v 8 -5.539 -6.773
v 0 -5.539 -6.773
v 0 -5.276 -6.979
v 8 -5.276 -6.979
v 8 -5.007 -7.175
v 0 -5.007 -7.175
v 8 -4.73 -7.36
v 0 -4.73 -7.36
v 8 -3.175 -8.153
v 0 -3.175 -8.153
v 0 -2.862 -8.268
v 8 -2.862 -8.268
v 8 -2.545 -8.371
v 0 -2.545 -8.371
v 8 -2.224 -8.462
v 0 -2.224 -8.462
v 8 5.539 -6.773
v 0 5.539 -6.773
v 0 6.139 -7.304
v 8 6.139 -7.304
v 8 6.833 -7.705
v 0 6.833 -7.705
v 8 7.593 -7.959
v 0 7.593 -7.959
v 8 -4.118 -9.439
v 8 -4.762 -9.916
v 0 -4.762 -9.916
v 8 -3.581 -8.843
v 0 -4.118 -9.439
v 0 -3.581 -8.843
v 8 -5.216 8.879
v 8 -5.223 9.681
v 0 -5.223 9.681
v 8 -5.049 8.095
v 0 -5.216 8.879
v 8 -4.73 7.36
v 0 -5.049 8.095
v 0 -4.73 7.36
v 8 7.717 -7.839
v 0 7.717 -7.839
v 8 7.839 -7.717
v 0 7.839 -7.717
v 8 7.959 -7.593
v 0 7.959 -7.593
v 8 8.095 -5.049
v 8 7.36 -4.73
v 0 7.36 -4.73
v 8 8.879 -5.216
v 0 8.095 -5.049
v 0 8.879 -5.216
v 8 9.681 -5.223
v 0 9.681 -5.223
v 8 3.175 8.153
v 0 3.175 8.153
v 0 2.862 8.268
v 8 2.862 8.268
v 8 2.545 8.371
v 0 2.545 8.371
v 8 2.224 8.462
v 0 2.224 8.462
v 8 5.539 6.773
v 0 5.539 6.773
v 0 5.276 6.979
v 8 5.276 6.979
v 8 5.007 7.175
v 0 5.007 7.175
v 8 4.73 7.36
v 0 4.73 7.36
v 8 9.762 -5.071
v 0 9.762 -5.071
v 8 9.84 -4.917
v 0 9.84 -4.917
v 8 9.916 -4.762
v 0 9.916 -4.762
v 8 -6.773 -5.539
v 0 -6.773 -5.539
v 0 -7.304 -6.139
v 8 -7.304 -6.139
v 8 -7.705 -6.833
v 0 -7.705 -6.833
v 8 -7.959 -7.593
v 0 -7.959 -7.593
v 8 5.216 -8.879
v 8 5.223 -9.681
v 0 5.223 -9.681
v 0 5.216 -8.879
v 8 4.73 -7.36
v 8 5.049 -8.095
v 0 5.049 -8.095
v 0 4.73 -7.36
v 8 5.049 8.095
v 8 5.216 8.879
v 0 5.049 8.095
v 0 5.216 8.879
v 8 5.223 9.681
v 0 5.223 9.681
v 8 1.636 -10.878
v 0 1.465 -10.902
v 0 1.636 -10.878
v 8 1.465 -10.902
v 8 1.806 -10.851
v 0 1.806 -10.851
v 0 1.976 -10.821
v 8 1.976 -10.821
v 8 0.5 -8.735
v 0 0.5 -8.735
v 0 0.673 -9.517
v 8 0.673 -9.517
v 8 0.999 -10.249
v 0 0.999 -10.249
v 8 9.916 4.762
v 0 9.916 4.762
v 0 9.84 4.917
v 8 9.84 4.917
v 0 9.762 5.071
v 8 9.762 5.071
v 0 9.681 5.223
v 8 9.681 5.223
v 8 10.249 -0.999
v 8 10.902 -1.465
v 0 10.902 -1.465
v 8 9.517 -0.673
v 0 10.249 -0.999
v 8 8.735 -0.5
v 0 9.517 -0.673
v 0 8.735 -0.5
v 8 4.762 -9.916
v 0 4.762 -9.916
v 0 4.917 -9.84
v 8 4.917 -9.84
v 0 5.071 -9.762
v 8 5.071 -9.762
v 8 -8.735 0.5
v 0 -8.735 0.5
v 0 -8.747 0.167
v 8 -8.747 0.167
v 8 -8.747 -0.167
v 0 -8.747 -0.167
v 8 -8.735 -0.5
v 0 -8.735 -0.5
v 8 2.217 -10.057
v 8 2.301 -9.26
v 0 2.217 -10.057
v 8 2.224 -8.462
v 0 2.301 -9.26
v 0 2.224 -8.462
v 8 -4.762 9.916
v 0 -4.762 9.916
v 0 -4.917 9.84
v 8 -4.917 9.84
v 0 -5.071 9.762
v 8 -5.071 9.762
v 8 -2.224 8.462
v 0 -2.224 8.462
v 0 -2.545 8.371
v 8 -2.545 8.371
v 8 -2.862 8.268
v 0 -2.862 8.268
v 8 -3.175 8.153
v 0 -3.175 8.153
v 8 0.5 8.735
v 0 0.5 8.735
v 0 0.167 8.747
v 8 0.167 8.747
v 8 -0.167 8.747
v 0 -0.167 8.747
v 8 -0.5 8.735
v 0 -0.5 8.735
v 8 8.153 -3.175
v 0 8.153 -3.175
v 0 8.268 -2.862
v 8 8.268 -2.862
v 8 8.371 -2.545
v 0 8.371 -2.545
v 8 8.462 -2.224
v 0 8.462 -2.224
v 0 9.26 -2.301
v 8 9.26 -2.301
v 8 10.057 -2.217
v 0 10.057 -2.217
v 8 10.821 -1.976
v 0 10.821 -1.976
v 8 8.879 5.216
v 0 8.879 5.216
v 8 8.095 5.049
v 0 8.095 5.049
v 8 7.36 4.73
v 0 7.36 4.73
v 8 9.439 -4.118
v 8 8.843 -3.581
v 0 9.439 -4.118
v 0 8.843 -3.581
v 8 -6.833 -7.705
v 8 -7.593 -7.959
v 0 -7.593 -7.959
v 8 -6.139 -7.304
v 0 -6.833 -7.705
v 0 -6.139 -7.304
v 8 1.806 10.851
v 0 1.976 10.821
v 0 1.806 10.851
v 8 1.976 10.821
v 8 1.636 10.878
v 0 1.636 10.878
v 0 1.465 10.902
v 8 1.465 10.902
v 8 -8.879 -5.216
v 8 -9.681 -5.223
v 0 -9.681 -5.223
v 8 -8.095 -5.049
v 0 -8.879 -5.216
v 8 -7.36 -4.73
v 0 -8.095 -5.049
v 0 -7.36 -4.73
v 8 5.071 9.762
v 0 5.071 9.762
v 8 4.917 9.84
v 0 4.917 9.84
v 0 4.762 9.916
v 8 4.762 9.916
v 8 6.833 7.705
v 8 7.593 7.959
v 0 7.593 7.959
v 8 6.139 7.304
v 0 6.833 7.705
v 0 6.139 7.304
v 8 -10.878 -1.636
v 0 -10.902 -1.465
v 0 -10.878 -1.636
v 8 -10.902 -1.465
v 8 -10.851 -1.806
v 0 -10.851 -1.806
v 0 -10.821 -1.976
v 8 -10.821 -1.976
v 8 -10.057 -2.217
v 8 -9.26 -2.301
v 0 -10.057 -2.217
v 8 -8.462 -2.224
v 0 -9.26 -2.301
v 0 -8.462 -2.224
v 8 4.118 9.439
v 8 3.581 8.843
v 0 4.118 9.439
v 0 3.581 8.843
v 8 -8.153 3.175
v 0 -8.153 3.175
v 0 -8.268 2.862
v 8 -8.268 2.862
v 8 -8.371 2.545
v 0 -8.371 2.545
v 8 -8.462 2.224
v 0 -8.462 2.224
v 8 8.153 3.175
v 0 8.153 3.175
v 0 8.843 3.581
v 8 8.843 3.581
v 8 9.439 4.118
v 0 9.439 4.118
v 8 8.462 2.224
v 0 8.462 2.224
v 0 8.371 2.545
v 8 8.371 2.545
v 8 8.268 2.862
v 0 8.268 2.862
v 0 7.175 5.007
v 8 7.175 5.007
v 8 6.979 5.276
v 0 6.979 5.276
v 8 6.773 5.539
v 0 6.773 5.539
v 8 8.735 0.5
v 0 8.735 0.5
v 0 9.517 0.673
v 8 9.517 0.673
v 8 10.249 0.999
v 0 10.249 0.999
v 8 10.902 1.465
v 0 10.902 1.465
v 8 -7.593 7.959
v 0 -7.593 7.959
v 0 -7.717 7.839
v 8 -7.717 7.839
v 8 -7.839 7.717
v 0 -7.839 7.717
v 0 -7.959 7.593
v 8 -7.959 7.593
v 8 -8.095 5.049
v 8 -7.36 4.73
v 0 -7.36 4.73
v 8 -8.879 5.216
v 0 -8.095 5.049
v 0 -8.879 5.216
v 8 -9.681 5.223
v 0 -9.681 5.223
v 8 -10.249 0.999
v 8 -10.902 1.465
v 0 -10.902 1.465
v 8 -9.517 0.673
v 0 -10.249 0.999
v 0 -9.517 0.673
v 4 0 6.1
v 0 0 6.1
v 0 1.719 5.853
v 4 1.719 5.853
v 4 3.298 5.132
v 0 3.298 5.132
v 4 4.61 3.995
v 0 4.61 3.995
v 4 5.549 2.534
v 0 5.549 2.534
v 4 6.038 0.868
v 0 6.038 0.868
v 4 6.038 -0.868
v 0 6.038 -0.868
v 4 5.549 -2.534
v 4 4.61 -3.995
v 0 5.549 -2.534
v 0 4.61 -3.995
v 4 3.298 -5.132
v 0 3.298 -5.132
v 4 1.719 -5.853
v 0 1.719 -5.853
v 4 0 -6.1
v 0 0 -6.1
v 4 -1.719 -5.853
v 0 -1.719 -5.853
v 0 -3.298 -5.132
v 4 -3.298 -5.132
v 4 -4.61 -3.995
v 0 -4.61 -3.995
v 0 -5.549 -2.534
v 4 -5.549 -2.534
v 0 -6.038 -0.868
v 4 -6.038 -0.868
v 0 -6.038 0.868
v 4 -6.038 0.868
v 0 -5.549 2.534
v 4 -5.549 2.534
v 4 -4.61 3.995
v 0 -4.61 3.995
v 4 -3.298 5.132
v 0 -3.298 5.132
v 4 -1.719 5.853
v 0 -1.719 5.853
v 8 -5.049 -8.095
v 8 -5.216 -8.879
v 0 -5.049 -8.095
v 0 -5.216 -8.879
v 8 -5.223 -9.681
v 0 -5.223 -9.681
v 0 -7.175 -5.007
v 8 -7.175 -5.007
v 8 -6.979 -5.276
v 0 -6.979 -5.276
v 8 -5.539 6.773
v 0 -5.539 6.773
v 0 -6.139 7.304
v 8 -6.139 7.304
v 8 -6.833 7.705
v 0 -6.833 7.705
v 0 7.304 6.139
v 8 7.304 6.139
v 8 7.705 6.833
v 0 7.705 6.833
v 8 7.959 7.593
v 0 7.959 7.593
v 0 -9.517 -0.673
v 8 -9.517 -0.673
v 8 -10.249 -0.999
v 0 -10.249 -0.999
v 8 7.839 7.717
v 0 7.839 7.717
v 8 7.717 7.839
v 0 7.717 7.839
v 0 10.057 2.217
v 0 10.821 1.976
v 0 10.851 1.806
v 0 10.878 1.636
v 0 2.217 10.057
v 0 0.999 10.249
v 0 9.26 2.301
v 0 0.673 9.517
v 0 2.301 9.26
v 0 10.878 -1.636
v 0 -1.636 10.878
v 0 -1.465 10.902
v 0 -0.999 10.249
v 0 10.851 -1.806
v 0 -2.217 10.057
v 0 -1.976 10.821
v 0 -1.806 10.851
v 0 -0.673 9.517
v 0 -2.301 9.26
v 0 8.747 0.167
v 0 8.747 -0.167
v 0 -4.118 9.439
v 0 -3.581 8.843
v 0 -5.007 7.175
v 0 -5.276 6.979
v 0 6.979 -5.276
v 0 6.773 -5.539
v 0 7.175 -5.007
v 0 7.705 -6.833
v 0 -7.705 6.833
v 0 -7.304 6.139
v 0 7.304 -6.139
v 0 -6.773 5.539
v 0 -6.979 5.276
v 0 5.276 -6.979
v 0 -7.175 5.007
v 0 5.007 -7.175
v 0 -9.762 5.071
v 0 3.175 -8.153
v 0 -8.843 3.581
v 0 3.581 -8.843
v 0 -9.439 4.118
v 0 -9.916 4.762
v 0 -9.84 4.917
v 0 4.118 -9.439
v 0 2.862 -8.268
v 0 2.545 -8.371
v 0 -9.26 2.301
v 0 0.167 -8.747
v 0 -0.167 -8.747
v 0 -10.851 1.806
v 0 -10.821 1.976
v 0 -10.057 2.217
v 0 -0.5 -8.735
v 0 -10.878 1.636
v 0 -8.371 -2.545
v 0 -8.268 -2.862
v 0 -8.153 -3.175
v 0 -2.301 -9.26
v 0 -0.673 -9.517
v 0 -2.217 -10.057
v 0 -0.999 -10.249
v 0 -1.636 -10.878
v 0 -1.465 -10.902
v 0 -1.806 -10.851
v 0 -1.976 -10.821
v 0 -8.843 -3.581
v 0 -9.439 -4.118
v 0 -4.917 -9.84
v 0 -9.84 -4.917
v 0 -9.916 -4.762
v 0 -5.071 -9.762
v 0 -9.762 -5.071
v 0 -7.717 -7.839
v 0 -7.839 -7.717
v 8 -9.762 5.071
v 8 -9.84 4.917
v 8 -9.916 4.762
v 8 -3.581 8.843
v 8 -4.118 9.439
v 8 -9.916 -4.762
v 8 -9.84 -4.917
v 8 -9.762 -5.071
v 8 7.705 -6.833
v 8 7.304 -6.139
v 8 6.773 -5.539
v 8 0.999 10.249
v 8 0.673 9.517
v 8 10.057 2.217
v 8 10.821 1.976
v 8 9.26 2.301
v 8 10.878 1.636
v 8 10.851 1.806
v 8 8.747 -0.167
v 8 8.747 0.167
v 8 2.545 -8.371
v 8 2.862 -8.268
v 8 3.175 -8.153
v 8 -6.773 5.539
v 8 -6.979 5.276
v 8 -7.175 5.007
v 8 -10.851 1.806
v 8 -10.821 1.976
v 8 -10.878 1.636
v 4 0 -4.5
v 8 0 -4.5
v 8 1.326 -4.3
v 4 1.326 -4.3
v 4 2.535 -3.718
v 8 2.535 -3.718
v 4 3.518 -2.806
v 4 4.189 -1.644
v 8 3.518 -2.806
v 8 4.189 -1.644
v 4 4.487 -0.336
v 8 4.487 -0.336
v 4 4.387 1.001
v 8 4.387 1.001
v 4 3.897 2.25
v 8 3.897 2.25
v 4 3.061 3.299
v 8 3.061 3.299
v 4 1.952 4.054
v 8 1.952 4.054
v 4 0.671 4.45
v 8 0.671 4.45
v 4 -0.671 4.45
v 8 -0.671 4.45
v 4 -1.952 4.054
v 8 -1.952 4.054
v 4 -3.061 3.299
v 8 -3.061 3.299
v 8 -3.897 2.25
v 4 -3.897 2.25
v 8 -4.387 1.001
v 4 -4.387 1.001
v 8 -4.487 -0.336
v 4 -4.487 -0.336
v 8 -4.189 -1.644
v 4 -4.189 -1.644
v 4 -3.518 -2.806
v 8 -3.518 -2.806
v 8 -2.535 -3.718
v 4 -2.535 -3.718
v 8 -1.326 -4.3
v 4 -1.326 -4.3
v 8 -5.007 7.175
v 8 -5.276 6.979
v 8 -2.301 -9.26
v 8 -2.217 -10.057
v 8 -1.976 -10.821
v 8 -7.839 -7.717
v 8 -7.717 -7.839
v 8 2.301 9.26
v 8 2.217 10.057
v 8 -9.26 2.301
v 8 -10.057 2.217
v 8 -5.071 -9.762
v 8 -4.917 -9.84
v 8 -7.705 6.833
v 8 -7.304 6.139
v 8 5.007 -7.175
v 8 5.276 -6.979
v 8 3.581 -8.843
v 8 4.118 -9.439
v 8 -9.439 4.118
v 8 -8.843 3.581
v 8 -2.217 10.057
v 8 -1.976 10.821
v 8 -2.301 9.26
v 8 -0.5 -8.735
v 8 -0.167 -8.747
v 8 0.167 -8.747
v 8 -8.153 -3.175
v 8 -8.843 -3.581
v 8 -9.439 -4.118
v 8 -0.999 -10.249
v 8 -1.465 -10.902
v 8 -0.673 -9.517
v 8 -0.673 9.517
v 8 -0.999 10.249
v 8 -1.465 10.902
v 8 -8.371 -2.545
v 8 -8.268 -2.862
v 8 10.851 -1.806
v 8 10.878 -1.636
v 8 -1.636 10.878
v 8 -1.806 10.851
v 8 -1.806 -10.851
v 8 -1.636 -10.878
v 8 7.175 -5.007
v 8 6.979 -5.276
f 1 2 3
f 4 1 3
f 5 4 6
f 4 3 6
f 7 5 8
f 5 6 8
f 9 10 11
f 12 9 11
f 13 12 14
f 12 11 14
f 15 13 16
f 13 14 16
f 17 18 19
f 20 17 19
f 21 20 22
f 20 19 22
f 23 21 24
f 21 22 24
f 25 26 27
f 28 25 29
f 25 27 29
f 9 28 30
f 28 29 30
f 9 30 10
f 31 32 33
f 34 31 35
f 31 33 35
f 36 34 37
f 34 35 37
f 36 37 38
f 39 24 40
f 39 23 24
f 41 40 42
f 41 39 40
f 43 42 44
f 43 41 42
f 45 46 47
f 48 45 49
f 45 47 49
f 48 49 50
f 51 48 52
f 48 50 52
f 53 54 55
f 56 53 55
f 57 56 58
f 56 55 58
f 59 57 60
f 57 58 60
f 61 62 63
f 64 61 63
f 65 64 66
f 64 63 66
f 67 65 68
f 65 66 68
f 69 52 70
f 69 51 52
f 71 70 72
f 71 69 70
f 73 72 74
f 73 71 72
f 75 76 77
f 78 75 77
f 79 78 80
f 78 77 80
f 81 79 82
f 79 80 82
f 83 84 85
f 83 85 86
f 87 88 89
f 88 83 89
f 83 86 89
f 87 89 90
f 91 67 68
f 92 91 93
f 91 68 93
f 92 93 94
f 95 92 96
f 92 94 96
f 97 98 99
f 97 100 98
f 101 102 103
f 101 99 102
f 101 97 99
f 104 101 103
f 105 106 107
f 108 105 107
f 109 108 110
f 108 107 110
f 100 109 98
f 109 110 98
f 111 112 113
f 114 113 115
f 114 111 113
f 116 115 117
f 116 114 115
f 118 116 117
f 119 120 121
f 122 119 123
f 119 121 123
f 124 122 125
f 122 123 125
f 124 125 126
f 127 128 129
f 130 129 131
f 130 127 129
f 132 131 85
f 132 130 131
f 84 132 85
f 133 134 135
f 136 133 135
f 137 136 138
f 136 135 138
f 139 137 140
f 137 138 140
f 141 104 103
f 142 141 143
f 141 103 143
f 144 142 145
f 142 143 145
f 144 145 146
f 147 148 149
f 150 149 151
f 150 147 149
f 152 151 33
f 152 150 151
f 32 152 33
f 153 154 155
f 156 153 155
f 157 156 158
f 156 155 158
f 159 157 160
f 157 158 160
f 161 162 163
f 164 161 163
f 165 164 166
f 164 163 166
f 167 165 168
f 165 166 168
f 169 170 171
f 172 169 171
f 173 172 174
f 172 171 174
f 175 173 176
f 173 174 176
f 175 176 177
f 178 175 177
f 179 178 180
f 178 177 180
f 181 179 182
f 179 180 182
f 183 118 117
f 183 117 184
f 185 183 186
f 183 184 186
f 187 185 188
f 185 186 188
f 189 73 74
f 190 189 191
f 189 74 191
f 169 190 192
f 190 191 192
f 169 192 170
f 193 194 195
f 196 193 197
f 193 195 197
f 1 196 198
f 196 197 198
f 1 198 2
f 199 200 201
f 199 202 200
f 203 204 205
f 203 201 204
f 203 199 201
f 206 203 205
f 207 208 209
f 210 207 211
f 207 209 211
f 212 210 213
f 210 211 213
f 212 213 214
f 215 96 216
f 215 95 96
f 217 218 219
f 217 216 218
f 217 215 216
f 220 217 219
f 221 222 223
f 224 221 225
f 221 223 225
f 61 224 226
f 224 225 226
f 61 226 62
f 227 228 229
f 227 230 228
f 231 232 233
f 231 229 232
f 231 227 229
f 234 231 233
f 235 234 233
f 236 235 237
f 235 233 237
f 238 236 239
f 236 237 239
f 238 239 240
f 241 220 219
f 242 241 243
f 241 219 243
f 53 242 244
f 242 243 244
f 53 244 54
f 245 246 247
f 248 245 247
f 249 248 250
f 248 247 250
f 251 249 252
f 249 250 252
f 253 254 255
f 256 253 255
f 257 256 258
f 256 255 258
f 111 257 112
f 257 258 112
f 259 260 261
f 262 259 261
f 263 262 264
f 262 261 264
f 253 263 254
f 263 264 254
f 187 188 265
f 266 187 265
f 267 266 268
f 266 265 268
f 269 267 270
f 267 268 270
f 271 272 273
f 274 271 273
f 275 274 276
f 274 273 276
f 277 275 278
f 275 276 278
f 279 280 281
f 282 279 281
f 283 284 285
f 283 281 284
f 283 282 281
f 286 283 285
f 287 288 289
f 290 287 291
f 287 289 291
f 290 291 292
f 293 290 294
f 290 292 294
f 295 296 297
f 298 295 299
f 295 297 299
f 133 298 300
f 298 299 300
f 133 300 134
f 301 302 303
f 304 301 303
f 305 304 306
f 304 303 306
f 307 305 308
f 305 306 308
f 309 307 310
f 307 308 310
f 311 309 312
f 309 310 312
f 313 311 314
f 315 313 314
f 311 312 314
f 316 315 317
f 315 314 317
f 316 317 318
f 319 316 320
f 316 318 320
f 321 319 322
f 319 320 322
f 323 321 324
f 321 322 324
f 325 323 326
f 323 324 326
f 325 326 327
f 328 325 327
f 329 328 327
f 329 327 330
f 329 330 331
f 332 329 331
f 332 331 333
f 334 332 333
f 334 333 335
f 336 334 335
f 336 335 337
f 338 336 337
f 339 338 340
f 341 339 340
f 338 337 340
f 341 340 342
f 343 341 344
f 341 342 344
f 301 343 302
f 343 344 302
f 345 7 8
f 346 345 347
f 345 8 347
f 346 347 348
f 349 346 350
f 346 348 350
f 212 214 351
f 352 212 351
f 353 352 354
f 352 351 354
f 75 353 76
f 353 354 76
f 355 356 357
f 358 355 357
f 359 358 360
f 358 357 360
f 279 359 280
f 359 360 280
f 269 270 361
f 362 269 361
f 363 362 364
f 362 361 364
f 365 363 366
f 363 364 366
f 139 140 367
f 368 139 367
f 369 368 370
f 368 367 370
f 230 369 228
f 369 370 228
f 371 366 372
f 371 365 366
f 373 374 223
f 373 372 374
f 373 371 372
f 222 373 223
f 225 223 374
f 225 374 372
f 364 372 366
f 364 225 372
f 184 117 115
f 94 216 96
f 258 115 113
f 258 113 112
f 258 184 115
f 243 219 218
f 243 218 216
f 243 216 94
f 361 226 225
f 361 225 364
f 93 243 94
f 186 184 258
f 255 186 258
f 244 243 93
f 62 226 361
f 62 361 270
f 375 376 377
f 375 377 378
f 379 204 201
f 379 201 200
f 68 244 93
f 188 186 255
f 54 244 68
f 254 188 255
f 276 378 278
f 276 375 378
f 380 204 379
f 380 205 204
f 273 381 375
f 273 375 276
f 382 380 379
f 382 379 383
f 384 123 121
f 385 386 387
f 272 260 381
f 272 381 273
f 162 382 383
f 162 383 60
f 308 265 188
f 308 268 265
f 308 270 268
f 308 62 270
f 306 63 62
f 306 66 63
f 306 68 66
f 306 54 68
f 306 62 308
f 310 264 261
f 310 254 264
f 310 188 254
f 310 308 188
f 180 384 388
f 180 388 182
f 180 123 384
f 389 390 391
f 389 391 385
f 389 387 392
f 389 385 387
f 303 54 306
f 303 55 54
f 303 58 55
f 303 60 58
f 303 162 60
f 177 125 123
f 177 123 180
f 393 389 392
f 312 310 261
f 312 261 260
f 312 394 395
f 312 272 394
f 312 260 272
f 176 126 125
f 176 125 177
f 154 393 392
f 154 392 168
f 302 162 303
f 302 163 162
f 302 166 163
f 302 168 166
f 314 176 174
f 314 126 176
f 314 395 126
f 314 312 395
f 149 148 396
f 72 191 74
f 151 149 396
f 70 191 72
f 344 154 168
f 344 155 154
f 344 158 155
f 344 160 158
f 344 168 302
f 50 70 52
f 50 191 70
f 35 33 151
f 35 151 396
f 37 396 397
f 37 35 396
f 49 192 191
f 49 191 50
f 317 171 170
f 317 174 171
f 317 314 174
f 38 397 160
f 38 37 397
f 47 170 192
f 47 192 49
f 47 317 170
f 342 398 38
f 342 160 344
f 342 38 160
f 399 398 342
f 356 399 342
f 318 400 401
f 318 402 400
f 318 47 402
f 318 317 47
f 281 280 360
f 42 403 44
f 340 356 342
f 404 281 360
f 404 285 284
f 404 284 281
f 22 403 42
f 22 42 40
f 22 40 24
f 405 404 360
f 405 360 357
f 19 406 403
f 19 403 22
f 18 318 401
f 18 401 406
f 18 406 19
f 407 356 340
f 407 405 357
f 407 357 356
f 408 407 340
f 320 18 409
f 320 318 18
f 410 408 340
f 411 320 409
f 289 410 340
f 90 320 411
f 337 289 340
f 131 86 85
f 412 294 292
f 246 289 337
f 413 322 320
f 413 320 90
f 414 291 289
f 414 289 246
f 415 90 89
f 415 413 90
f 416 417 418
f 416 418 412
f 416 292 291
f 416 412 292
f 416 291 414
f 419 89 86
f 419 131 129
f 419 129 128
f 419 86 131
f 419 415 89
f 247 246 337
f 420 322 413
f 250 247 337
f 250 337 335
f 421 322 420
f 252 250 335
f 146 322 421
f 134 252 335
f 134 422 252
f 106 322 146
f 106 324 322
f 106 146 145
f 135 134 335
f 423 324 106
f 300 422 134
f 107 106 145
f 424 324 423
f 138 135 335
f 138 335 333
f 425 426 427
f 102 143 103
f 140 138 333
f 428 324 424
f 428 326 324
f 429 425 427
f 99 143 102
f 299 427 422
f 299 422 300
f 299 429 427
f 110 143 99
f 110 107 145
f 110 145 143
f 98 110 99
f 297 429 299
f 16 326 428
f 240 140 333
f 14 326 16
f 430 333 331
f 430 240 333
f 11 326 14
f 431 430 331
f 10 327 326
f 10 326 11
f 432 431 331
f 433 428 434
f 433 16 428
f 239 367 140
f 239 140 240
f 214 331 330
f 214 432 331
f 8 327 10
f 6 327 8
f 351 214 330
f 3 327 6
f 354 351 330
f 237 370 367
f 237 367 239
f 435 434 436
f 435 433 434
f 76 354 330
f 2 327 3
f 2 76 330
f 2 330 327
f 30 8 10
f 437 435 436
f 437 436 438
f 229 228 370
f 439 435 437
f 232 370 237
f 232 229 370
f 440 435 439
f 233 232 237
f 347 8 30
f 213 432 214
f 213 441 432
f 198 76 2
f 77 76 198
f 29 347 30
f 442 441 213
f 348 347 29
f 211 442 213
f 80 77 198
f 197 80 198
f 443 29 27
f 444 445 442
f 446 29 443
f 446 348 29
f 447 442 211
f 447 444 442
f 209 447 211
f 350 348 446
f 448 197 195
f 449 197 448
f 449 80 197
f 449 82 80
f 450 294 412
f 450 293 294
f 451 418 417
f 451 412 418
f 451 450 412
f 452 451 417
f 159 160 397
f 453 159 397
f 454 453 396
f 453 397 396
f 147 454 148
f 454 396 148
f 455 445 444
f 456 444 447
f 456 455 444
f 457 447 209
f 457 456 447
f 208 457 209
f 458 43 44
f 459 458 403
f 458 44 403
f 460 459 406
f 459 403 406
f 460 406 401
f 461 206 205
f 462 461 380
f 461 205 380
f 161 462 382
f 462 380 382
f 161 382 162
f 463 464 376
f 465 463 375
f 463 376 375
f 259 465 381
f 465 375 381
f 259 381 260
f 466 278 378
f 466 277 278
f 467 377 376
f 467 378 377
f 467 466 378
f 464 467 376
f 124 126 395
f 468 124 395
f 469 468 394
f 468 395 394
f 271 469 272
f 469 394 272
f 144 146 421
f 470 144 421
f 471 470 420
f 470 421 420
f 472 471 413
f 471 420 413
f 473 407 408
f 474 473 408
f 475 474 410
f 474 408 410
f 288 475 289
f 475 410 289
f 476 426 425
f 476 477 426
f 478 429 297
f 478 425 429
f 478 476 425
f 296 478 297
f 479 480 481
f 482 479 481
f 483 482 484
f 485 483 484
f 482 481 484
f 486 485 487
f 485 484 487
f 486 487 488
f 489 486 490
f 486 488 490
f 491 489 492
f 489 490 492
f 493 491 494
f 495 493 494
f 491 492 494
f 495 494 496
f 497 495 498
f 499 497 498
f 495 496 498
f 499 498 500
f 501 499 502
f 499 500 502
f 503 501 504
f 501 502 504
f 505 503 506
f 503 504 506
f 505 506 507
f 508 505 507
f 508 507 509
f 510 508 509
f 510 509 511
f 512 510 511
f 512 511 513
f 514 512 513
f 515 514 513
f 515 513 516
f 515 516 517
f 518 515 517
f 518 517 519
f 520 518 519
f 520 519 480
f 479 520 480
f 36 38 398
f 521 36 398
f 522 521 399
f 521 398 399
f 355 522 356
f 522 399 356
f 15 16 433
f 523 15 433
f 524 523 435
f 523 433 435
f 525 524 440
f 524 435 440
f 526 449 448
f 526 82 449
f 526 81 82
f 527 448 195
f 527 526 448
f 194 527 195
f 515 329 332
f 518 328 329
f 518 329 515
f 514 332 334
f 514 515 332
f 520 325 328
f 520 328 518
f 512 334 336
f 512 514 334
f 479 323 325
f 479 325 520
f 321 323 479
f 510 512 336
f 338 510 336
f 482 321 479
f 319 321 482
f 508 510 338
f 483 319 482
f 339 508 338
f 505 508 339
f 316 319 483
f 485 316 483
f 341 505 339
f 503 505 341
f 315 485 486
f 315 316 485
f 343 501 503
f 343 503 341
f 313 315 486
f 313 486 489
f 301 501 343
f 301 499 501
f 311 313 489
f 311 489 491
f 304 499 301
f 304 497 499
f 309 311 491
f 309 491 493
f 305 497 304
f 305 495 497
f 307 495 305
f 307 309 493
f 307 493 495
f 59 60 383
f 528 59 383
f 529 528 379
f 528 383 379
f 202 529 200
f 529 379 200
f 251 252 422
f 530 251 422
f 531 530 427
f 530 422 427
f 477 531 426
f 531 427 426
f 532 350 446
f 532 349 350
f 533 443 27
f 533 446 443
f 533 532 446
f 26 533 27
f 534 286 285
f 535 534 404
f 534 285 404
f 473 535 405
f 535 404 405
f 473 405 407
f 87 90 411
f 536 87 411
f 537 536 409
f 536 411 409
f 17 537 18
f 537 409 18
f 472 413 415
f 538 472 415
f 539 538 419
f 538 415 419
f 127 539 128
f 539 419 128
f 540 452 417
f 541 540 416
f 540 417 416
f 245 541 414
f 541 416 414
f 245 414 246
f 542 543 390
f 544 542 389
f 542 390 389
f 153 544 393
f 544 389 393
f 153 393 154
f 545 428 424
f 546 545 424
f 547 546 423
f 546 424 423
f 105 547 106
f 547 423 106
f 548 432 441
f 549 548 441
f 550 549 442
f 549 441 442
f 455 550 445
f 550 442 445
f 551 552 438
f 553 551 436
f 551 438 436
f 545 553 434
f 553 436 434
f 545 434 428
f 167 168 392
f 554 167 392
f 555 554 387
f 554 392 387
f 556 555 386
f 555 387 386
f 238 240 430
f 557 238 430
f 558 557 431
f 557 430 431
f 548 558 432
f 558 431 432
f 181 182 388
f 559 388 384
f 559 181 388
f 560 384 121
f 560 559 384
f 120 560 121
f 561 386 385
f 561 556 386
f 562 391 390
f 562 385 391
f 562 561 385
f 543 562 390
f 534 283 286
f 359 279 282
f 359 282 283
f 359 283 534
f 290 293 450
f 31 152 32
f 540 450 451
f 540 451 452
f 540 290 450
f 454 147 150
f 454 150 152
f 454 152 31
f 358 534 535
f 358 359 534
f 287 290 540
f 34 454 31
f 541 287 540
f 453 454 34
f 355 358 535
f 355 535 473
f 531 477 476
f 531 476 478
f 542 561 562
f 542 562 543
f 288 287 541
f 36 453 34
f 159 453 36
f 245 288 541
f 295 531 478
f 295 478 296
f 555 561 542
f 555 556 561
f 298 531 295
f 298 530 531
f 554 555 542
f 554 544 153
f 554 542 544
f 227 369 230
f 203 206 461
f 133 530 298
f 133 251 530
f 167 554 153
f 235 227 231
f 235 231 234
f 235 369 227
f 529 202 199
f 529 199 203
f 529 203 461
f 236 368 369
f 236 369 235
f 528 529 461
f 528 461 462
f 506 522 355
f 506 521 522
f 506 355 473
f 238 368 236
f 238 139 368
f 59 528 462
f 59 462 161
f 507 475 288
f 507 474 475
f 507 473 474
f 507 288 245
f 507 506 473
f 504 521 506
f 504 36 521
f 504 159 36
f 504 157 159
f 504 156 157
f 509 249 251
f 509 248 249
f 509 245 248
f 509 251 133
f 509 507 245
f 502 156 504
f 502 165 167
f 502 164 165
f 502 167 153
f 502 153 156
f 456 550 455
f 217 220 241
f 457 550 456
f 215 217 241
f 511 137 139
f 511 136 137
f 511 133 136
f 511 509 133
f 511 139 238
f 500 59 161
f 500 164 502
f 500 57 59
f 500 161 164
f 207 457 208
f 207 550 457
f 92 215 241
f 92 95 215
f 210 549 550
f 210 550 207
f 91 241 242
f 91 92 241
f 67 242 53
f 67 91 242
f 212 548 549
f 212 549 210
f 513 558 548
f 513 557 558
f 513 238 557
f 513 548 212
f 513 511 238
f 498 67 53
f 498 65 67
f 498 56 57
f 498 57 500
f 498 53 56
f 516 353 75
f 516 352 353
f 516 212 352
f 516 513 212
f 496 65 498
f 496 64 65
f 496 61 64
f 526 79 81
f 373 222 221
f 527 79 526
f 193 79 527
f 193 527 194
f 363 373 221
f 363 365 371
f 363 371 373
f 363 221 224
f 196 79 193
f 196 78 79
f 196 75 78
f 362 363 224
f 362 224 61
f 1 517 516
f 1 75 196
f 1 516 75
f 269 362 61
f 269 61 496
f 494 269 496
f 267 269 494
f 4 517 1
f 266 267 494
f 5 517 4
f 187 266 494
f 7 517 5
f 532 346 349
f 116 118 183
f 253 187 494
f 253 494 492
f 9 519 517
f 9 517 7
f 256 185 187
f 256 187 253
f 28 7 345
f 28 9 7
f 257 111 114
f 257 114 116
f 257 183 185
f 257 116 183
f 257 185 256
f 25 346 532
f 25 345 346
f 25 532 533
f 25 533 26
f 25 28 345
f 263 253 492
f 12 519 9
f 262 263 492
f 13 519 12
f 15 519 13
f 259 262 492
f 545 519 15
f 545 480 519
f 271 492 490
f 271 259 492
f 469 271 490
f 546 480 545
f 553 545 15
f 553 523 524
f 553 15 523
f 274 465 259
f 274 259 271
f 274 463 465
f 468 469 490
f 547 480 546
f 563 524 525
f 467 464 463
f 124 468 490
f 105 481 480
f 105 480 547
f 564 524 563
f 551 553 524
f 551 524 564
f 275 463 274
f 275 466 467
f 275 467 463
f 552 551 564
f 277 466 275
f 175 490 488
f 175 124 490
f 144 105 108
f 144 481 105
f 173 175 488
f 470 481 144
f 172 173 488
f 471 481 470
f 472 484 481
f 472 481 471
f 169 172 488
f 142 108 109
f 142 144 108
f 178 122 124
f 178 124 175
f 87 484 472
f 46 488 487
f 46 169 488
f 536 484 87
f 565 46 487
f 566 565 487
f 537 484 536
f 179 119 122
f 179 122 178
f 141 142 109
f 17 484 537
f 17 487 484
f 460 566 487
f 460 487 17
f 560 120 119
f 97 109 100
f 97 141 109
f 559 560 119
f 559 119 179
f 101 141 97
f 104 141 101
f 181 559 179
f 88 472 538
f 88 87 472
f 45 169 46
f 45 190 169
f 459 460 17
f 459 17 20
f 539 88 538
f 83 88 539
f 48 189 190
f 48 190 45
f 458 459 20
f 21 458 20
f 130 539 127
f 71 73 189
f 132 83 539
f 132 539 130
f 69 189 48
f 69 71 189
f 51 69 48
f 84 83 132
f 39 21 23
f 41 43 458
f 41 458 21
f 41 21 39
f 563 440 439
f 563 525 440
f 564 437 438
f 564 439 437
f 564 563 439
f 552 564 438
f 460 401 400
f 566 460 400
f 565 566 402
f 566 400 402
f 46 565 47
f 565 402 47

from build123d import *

# Parameters (mm, degrees)
BASPROSKE_W        = 10
BASPROSKE_H        = 11
TOOTHCUT_DEPTH     = 19.493242009
TEETHCUTS_COUNT    = 20
TEETHCUTS_ANGLE    = 342
BORSKE_R           = 2.5
BORE_DEPTH         = 50.0000508
SKETCH1_R          = 6.1
CUT_EXTRUDE1_DEPTH = 4
SKETCH2_R          = 4.5
CUT_EXTRUDE2_DEPTH = 19.376827944
SKETCH3_R          = 14.898414192
CUT_EXTRUDE3_DEPTH = 2


with BuildPart() as part:
    # BasProSke → Base-Revolve (revolve)
    with BuildSketch(Plane(origin=(0, 0, 0), x_dir=(1, 0, 0), z_dir=(0, 1, 0)), mode=Mode.PRIVATE) as base_revolve_sk:
        with Locations((5, 5.5)):
            Rectangle(BASPROSKE_W, BASPROSKE_H)
    revolve(base_revolve_sk.sketch.rotate(Axis((-10, 0, 0), (1, 0, 0)), 180), axis=Axis((-10, 0, 0), (1, 0, 0)))

    # TooCutSke → ToothCut (cut, through all)
    with BuildSketch(Plane(origin=(0, 0, 0), x_dir=(0, 0, -1), z_dir=(1, 0, 0))):
        with BuildLine():
            ThreePointArc((0.499924007, 8.734705318), (0, 8.749), (-0.499924007, 8.734705318))
            ThreePointArc((-0.499924007, 8.734705318), (-0.824302243, 9.905497836), (-1.485192705, 10.924909509))
            ThreePointArc((-1.485192705, 10.924909509), (0, 11.0254), (1.485192705, 10.924909509))
            ThreePointArc((1.485192705, 10.924909509), (0.824302243, 9.905497836), (0.499924007, 8.734705318))
        make_face()
    toothcut = extrude(amount=TOOTHCUT_DEPTH, mode=Mode.SUBTRACT)

    # TeethCuts: ToothCut ×20 about axis
    teethcuts_axis = Axis((-10, 0, 0), (1, 0, 0))
    for i in range(1, TEETHCUTS_COUNT):
        add(toothcut.rotate(teethcuts_axis, i * TEETHCUTS_ANGLE / (TEETHCUTS_COUNT - 1)), mode=Mode.SUBTRACT)

    # BorSke → Bore (cut, symmetric)
    with BuildSketch(Plane(origin=(0, 0, 0), x_dir=(0, 0, -1), z_dir=(1, 0, 0))):
        with Locations(Location((0, 0, 0), (0, 0, 180))):
            Circle(BORSKE_R)
    extrude(amount=BORE_DEPTH, both=True, mode=Mode.SUBTRACT)

    # Sketch1 → Cut-Extrude1 (cut)
    with BuildSketch(Plane.ZY):
        Circle(SKETCH1_R)
    extrude(amount=-CUT_EXTRUDE1_DEPTH, mode=Mode.SUBTRACT)

    # Sketch2 → Cut-Extrude2 (cut, through all)
    with BuildSketch(Plane(origin=(10, 0, 0), x_dir=(0, 0, -1), z_dir=(1, 0, 0))):
        Circle(SKETCH2_R)
    extrude(amount=-CUT_EXTRUDE2_DEPTH, mode=Mode.SUBTRACT)

    # Sketch3 → Cut-Extrude3 (cut)
    with BuildSketch(Plane(origin=(10, 0, 0), x_dir=(0, 0, -1), z_dir=(1, 0, 0))):
        Circle(SKETCH3_R)
    extrude(amount=-CUT_EXTRUDE3_DEPTH, mode=Mode.SUBTRACT)


solid = part.part
